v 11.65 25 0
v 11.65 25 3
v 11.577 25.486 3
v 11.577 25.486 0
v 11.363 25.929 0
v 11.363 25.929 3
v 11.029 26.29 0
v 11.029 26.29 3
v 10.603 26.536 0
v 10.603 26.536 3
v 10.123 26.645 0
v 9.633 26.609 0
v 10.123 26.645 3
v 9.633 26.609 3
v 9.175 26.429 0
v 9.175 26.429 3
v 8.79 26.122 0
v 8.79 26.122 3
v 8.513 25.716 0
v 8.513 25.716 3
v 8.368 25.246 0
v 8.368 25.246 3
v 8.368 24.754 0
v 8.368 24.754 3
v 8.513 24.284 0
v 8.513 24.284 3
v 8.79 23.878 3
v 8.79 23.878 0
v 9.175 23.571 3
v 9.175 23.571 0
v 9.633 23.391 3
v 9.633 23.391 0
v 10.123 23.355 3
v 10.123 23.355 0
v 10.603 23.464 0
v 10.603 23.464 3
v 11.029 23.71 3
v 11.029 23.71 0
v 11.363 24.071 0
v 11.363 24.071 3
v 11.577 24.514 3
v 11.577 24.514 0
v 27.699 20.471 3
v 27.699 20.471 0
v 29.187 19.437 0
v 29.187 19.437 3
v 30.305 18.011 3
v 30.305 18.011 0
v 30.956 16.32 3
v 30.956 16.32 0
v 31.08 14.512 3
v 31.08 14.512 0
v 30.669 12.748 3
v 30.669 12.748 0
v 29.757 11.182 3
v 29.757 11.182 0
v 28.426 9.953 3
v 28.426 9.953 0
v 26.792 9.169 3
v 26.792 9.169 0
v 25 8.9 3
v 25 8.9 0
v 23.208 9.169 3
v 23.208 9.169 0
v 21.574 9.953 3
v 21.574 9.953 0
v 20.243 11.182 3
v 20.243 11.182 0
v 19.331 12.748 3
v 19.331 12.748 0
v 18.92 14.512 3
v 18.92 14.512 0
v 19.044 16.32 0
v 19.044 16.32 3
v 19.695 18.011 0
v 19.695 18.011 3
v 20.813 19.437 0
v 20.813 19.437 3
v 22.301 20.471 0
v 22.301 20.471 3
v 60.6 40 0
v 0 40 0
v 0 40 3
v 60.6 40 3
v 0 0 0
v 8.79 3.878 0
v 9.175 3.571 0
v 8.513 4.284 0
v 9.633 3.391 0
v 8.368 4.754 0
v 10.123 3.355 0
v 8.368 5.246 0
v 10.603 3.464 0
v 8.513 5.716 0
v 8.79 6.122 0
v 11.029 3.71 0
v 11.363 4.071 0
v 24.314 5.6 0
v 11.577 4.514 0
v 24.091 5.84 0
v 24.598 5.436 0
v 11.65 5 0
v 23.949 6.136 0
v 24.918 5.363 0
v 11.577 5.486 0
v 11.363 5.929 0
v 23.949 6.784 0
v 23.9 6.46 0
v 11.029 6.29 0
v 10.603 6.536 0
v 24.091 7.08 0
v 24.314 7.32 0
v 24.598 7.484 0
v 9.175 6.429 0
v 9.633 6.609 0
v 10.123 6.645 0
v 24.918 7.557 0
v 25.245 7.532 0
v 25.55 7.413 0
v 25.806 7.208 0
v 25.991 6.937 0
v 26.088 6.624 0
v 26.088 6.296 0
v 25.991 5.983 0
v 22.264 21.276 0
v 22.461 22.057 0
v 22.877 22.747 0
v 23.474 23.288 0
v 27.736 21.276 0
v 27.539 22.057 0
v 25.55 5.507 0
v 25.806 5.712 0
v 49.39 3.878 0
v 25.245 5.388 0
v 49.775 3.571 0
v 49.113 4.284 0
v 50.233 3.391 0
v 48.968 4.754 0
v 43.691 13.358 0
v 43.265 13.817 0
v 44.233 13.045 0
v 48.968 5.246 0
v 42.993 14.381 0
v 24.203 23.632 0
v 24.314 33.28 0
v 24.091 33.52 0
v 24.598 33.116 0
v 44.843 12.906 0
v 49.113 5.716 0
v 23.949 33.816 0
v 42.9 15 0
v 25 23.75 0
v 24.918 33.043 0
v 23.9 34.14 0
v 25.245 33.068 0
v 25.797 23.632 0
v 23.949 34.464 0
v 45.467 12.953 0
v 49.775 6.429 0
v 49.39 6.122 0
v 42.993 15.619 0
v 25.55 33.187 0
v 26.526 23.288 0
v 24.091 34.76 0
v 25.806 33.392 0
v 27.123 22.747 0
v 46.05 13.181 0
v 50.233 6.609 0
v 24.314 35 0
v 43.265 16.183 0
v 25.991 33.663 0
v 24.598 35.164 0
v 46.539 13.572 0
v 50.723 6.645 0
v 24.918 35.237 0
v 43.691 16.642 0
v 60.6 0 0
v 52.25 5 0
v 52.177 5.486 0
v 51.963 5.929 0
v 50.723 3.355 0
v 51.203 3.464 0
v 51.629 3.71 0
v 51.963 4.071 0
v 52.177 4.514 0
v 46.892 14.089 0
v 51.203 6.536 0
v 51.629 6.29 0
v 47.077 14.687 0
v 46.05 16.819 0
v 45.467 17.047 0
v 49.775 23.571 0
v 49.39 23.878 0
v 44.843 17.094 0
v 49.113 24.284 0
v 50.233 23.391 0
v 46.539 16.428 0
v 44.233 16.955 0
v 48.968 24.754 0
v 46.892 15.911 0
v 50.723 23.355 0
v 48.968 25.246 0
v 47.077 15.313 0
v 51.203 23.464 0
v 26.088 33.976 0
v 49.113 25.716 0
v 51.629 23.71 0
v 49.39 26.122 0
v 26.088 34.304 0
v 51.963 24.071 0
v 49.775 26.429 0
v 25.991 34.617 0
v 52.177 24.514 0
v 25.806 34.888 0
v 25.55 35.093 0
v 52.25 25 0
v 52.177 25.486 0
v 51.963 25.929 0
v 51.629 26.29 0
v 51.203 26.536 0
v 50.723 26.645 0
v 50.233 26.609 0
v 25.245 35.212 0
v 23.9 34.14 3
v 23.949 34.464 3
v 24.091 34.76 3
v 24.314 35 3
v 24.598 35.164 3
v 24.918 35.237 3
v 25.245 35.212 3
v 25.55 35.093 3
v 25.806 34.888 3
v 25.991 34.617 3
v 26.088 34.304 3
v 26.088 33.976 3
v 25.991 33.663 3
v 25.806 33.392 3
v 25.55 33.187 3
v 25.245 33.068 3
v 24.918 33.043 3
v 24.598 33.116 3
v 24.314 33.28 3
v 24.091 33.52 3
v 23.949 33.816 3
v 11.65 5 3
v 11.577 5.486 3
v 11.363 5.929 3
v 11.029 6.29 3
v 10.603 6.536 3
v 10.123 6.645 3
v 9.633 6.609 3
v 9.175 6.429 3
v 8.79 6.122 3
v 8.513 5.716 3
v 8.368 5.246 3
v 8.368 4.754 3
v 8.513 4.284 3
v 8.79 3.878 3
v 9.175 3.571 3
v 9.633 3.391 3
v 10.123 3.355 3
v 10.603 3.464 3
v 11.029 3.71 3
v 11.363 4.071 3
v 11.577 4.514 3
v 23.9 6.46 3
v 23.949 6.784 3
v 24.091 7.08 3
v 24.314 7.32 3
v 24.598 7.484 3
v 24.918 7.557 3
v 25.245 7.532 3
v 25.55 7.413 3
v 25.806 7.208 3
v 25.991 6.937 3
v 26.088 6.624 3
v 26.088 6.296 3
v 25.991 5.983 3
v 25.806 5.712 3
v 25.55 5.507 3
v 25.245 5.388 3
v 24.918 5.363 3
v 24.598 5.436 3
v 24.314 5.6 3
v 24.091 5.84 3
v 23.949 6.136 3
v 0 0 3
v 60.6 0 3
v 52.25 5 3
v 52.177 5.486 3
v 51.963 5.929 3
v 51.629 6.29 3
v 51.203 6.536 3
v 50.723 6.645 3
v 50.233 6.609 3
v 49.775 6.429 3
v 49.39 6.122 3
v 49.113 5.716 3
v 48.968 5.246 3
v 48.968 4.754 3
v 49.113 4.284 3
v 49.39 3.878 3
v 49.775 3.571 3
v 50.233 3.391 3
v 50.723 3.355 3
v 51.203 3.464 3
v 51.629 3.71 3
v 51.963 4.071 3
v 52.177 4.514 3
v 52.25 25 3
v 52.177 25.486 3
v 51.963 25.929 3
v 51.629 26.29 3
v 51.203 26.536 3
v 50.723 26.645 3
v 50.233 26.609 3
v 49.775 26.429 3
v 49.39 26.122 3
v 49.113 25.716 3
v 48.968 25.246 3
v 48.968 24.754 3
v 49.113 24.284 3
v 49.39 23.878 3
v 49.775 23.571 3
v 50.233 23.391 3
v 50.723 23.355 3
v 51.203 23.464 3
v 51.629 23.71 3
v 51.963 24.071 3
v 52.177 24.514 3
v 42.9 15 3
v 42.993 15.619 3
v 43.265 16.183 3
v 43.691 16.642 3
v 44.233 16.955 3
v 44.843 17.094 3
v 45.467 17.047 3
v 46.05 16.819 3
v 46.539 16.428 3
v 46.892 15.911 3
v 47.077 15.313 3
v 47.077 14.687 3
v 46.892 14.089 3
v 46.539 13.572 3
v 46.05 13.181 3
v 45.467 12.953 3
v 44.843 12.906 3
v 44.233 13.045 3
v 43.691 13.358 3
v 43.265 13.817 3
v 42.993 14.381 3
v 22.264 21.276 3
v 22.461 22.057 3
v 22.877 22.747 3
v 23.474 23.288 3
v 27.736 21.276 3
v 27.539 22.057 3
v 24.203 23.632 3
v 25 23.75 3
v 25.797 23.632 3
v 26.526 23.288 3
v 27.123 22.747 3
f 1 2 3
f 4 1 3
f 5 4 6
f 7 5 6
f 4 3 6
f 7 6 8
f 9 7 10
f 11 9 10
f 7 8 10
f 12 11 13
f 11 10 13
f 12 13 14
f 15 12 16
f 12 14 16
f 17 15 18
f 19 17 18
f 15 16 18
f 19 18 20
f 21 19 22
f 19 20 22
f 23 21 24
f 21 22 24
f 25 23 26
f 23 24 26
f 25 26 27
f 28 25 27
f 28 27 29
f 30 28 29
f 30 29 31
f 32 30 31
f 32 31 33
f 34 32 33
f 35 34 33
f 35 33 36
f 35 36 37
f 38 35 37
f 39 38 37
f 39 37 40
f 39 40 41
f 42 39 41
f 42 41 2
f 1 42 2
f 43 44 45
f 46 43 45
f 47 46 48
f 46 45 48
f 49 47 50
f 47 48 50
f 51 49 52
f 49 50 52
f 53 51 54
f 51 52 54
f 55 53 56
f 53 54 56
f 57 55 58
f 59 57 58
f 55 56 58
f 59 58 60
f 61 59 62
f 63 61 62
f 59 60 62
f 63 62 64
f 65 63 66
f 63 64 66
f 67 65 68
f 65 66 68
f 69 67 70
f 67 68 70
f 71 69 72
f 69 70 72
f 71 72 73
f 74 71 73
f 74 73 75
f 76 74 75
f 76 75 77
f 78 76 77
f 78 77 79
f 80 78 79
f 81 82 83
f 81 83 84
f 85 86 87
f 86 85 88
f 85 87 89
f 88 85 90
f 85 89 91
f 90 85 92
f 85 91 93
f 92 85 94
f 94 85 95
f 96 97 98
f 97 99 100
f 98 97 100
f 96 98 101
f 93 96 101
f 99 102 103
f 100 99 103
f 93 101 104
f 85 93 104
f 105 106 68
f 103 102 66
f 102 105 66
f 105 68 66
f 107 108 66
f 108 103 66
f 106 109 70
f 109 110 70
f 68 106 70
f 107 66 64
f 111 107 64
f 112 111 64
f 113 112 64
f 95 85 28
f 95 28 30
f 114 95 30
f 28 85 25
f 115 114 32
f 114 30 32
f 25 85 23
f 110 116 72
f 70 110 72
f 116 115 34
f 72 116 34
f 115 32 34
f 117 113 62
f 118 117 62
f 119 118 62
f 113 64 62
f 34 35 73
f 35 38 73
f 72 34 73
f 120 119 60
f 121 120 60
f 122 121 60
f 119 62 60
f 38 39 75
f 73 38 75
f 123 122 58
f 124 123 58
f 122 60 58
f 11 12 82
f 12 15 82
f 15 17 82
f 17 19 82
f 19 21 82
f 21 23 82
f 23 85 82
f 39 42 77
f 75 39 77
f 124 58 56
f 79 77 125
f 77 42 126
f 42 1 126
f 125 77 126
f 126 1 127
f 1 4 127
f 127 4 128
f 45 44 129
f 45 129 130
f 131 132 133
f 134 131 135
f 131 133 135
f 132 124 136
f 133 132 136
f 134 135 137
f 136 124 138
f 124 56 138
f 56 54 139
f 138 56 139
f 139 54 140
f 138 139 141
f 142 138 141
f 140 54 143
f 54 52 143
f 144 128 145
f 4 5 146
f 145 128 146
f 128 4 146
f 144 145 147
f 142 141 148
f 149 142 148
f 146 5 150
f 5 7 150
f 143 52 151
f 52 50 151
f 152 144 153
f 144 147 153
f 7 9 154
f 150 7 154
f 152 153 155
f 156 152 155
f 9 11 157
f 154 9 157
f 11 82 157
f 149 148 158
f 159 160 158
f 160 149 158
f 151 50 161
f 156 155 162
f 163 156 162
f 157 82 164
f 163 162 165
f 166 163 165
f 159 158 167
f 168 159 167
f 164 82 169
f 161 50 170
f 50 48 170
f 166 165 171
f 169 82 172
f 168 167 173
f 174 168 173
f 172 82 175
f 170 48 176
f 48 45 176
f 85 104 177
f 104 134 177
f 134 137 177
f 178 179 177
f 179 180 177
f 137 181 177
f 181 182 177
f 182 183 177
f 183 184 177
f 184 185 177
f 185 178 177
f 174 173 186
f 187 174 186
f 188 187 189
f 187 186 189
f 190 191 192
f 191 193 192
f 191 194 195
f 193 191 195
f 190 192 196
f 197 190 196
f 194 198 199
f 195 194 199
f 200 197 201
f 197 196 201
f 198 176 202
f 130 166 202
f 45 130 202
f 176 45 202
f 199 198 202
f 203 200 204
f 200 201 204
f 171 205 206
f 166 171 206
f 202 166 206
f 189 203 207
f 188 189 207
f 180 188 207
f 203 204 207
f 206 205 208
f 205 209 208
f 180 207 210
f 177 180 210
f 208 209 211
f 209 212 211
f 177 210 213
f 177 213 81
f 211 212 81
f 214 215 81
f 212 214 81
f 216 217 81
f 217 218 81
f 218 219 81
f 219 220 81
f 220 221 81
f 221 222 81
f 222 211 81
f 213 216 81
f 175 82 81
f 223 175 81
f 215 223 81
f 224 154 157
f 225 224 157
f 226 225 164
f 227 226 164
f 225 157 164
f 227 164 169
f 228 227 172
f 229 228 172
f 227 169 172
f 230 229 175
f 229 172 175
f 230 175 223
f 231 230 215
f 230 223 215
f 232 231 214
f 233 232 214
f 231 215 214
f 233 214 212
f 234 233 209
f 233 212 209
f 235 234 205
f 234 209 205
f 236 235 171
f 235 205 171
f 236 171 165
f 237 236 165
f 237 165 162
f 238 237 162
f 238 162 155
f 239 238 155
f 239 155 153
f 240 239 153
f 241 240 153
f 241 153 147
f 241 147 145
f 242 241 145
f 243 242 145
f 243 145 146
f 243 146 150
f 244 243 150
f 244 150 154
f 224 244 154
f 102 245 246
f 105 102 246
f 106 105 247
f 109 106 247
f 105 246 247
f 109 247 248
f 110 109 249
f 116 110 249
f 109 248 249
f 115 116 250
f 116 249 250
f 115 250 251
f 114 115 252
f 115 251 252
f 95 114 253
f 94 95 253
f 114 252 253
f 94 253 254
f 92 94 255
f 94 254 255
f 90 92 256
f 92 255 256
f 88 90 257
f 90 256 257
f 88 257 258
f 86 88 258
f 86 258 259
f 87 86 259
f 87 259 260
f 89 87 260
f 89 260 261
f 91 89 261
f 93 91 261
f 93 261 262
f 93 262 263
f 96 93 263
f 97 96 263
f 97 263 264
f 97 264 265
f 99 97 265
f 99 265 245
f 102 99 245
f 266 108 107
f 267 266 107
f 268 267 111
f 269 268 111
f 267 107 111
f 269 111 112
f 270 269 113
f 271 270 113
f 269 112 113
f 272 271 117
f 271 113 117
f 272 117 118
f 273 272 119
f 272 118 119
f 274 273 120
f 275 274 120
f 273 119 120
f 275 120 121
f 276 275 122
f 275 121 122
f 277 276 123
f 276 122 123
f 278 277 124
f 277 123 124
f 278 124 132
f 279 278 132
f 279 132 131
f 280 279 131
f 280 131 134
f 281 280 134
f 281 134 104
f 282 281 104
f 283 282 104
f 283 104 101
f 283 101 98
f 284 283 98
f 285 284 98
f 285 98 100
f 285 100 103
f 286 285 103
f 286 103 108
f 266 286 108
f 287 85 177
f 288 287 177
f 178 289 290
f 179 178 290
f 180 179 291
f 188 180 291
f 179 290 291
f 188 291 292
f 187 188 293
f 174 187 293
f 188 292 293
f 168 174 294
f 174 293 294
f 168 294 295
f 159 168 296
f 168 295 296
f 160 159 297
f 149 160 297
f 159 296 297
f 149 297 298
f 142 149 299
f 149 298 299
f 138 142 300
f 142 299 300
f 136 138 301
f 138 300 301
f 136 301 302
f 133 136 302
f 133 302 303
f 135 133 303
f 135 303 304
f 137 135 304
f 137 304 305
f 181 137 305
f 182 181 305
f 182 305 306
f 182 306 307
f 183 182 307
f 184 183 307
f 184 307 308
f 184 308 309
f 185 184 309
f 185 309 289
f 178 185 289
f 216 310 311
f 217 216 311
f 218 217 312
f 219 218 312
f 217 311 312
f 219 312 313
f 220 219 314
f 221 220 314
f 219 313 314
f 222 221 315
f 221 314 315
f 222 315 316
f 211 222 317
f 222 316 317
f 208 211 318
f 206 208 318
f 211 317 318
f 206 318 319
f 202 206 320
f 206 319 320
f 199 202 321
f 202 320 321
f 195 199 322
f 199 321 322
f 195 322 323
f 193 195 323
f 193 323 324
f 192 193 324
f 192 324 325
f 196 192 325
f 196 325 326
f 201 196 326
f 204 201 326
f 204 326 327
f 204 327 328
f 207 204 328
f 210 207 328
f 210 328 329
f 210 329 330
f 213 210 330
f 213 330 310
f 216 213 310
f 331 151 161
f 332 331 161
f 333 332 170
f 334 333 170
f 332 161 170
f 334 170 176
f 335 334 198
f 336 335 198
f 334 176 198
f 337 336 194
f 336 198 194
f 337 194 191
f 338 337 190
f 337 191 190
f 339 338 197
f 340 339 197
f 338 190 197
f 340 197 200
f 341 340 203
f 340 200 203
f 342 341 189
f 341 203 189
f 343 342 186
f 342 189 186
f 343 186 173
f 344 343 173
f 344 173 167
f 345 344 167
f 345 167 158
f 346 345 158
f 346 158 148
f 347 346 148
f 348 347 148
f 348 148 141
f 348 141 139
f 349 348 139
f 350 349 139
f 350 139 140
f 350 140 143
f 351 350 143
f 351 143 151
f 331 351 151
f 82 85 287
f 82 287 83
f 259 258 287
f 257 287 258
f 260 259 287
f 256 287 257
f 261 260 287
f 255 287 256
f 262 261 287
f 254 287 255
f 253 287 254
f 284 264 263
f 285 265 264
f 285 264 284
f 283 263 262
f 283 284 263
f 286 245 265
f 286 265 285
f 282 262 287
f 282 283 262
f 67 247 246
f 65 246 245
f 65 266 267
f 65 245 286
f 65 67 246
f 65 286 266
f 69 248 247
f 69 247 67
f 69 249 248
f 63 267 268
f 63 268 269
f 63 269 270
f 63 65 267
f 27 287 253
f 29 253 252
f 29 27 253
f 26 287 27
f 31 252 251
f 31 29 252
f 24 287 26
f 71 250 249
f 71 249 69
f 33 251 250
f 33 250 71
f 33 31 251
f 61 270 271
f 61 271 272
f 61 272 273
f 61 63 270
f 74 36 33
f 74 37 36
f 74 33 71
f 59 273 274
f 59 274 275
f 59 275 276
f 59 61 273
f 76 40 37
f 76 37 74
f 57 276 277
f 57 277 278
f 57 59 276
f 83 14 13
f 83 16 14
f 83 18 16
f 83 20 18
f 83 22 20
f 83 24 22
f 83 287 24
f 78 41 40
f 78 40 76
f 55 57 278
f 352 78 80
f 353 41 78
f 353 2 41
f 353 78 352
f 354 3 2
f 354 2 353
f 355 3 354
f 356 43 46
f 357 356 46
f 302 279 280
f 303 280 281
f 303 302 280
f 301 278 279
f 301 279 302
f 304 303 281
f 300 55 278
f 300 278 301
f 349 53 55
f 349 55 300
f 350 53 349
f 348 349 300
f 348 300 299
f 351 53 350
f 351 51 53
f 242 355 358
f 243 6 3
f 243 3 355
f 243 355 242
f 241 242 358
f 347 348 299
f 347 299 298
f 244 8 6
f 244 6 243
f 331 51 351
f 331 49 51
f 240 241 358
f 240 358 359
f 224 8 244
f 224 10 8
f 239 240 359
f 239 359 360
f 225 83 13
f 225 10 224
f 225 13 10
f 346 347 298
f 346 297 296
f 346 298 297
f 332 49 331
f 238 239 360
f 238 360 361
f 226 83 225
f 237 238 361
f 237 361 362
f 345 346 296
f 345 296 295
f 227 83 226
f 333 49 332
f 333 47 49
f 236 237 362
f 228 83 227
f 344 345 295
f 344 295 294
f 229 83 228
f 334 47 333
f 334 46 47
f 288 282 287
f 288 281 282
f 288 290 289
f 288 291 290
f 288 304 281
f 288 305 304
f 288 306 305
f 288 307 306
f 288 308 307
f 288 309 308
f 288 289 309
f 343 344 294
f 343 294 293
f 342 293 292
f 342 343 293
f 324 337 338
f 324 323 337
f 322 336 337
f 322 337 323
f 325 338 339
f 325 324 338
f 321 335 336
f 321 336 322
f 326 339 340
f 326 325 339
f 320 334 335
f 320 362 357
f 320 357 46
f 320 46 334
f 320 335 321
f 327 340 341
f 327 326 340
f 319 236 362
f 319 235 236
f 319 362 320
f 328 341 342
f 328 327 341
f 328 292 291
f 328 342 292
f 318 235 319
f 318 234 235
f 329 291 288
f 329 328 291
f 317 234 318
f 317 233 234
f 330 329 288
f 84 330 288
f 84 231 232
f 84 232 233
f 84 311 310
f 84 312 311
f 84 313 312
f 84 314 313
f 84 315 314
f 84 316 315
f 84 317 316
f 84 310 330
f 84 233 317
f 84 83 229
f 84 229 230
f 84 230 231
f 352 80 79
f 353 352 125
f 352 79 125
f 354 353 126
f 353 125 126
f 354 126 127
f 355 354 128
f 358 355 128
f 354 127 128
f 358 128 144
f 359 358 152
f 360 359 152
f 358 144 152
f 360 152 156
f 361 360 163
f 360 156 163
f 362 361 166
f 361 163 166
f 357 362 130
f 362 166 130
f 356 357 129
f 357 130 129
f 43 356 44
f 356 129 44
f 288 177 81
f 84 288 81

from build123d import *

# Parameters (mm, degrees)
SKETCH_1_W          = 60.6
SKETCH_1_H          = 40
EXTRUDE_1_DEPTH     = 3
SKETCH_2_R          = 2.75
SKETCH_2_R_2        = 6.1
SKETCH_2_R_3        = 1.1
SKETCH_2_R_4        = 2.1
CUT_EXTRUDE_1_DEPTH = 73.672966088
SKETCH_3_R          = 1.65
CUT_EXTRUDE_2_DEPTH = 13


with BuildPart() as part:
    # 草图1 → 凸台-拉伸1 (new body)
    with BuildSketch(Plane.XY):
        with Locations((30.3, 20)):
            Rectangle(SKETCH_1_W, SKETCH_1_H)
    extrude(amount=EXTRUDE_1_DEPTH)

    # 草图2 → 切除-拉伸1 (cut, through all)
    with BuildSketch(Plane(origin=(0, 0, 0), x_dir=(-1, 0, 0), z_dir=(0, 0, -1))):
        with Locations((-25, 21)):
            Circle(SKETCH_2_R)
        with Locations((-25, 15)):
            Circle(SKETCH_2_R_2)
        with Locations((-25, 6.46)):
            Circle(SKETCH_2_R_3)
        with Locations((-25, 34.14)):
            Circle(SKETCH_2_R_3)
        with Locations((-45, 15)):
            Circle(SKETCH_2_R_4)
    extrude(amount=-CUT_EXTRUDE_1_DEPTH, mode=Mode.SUBTRACT)

    # 草图3 → 切除-拉伸2 (cut)
    with BuildSketch(Plane.XY.offset(3)):
        with Locations((50.6, 5)):
            Circle(SKETCH_3_R)
        with Locations((50.6, 25)):
            Circle(SKETCH_3_R)
        with Locations((10, 25)):
            Circle(SKETCH_3_R)
        with Locations((10, 5)):
            Circle(SKETCH_3_R)
    extrude(amount=-CUT_EXTRUDE_2_DEPTH, mode=Mode.SUBTRACT)


solid = part.part
